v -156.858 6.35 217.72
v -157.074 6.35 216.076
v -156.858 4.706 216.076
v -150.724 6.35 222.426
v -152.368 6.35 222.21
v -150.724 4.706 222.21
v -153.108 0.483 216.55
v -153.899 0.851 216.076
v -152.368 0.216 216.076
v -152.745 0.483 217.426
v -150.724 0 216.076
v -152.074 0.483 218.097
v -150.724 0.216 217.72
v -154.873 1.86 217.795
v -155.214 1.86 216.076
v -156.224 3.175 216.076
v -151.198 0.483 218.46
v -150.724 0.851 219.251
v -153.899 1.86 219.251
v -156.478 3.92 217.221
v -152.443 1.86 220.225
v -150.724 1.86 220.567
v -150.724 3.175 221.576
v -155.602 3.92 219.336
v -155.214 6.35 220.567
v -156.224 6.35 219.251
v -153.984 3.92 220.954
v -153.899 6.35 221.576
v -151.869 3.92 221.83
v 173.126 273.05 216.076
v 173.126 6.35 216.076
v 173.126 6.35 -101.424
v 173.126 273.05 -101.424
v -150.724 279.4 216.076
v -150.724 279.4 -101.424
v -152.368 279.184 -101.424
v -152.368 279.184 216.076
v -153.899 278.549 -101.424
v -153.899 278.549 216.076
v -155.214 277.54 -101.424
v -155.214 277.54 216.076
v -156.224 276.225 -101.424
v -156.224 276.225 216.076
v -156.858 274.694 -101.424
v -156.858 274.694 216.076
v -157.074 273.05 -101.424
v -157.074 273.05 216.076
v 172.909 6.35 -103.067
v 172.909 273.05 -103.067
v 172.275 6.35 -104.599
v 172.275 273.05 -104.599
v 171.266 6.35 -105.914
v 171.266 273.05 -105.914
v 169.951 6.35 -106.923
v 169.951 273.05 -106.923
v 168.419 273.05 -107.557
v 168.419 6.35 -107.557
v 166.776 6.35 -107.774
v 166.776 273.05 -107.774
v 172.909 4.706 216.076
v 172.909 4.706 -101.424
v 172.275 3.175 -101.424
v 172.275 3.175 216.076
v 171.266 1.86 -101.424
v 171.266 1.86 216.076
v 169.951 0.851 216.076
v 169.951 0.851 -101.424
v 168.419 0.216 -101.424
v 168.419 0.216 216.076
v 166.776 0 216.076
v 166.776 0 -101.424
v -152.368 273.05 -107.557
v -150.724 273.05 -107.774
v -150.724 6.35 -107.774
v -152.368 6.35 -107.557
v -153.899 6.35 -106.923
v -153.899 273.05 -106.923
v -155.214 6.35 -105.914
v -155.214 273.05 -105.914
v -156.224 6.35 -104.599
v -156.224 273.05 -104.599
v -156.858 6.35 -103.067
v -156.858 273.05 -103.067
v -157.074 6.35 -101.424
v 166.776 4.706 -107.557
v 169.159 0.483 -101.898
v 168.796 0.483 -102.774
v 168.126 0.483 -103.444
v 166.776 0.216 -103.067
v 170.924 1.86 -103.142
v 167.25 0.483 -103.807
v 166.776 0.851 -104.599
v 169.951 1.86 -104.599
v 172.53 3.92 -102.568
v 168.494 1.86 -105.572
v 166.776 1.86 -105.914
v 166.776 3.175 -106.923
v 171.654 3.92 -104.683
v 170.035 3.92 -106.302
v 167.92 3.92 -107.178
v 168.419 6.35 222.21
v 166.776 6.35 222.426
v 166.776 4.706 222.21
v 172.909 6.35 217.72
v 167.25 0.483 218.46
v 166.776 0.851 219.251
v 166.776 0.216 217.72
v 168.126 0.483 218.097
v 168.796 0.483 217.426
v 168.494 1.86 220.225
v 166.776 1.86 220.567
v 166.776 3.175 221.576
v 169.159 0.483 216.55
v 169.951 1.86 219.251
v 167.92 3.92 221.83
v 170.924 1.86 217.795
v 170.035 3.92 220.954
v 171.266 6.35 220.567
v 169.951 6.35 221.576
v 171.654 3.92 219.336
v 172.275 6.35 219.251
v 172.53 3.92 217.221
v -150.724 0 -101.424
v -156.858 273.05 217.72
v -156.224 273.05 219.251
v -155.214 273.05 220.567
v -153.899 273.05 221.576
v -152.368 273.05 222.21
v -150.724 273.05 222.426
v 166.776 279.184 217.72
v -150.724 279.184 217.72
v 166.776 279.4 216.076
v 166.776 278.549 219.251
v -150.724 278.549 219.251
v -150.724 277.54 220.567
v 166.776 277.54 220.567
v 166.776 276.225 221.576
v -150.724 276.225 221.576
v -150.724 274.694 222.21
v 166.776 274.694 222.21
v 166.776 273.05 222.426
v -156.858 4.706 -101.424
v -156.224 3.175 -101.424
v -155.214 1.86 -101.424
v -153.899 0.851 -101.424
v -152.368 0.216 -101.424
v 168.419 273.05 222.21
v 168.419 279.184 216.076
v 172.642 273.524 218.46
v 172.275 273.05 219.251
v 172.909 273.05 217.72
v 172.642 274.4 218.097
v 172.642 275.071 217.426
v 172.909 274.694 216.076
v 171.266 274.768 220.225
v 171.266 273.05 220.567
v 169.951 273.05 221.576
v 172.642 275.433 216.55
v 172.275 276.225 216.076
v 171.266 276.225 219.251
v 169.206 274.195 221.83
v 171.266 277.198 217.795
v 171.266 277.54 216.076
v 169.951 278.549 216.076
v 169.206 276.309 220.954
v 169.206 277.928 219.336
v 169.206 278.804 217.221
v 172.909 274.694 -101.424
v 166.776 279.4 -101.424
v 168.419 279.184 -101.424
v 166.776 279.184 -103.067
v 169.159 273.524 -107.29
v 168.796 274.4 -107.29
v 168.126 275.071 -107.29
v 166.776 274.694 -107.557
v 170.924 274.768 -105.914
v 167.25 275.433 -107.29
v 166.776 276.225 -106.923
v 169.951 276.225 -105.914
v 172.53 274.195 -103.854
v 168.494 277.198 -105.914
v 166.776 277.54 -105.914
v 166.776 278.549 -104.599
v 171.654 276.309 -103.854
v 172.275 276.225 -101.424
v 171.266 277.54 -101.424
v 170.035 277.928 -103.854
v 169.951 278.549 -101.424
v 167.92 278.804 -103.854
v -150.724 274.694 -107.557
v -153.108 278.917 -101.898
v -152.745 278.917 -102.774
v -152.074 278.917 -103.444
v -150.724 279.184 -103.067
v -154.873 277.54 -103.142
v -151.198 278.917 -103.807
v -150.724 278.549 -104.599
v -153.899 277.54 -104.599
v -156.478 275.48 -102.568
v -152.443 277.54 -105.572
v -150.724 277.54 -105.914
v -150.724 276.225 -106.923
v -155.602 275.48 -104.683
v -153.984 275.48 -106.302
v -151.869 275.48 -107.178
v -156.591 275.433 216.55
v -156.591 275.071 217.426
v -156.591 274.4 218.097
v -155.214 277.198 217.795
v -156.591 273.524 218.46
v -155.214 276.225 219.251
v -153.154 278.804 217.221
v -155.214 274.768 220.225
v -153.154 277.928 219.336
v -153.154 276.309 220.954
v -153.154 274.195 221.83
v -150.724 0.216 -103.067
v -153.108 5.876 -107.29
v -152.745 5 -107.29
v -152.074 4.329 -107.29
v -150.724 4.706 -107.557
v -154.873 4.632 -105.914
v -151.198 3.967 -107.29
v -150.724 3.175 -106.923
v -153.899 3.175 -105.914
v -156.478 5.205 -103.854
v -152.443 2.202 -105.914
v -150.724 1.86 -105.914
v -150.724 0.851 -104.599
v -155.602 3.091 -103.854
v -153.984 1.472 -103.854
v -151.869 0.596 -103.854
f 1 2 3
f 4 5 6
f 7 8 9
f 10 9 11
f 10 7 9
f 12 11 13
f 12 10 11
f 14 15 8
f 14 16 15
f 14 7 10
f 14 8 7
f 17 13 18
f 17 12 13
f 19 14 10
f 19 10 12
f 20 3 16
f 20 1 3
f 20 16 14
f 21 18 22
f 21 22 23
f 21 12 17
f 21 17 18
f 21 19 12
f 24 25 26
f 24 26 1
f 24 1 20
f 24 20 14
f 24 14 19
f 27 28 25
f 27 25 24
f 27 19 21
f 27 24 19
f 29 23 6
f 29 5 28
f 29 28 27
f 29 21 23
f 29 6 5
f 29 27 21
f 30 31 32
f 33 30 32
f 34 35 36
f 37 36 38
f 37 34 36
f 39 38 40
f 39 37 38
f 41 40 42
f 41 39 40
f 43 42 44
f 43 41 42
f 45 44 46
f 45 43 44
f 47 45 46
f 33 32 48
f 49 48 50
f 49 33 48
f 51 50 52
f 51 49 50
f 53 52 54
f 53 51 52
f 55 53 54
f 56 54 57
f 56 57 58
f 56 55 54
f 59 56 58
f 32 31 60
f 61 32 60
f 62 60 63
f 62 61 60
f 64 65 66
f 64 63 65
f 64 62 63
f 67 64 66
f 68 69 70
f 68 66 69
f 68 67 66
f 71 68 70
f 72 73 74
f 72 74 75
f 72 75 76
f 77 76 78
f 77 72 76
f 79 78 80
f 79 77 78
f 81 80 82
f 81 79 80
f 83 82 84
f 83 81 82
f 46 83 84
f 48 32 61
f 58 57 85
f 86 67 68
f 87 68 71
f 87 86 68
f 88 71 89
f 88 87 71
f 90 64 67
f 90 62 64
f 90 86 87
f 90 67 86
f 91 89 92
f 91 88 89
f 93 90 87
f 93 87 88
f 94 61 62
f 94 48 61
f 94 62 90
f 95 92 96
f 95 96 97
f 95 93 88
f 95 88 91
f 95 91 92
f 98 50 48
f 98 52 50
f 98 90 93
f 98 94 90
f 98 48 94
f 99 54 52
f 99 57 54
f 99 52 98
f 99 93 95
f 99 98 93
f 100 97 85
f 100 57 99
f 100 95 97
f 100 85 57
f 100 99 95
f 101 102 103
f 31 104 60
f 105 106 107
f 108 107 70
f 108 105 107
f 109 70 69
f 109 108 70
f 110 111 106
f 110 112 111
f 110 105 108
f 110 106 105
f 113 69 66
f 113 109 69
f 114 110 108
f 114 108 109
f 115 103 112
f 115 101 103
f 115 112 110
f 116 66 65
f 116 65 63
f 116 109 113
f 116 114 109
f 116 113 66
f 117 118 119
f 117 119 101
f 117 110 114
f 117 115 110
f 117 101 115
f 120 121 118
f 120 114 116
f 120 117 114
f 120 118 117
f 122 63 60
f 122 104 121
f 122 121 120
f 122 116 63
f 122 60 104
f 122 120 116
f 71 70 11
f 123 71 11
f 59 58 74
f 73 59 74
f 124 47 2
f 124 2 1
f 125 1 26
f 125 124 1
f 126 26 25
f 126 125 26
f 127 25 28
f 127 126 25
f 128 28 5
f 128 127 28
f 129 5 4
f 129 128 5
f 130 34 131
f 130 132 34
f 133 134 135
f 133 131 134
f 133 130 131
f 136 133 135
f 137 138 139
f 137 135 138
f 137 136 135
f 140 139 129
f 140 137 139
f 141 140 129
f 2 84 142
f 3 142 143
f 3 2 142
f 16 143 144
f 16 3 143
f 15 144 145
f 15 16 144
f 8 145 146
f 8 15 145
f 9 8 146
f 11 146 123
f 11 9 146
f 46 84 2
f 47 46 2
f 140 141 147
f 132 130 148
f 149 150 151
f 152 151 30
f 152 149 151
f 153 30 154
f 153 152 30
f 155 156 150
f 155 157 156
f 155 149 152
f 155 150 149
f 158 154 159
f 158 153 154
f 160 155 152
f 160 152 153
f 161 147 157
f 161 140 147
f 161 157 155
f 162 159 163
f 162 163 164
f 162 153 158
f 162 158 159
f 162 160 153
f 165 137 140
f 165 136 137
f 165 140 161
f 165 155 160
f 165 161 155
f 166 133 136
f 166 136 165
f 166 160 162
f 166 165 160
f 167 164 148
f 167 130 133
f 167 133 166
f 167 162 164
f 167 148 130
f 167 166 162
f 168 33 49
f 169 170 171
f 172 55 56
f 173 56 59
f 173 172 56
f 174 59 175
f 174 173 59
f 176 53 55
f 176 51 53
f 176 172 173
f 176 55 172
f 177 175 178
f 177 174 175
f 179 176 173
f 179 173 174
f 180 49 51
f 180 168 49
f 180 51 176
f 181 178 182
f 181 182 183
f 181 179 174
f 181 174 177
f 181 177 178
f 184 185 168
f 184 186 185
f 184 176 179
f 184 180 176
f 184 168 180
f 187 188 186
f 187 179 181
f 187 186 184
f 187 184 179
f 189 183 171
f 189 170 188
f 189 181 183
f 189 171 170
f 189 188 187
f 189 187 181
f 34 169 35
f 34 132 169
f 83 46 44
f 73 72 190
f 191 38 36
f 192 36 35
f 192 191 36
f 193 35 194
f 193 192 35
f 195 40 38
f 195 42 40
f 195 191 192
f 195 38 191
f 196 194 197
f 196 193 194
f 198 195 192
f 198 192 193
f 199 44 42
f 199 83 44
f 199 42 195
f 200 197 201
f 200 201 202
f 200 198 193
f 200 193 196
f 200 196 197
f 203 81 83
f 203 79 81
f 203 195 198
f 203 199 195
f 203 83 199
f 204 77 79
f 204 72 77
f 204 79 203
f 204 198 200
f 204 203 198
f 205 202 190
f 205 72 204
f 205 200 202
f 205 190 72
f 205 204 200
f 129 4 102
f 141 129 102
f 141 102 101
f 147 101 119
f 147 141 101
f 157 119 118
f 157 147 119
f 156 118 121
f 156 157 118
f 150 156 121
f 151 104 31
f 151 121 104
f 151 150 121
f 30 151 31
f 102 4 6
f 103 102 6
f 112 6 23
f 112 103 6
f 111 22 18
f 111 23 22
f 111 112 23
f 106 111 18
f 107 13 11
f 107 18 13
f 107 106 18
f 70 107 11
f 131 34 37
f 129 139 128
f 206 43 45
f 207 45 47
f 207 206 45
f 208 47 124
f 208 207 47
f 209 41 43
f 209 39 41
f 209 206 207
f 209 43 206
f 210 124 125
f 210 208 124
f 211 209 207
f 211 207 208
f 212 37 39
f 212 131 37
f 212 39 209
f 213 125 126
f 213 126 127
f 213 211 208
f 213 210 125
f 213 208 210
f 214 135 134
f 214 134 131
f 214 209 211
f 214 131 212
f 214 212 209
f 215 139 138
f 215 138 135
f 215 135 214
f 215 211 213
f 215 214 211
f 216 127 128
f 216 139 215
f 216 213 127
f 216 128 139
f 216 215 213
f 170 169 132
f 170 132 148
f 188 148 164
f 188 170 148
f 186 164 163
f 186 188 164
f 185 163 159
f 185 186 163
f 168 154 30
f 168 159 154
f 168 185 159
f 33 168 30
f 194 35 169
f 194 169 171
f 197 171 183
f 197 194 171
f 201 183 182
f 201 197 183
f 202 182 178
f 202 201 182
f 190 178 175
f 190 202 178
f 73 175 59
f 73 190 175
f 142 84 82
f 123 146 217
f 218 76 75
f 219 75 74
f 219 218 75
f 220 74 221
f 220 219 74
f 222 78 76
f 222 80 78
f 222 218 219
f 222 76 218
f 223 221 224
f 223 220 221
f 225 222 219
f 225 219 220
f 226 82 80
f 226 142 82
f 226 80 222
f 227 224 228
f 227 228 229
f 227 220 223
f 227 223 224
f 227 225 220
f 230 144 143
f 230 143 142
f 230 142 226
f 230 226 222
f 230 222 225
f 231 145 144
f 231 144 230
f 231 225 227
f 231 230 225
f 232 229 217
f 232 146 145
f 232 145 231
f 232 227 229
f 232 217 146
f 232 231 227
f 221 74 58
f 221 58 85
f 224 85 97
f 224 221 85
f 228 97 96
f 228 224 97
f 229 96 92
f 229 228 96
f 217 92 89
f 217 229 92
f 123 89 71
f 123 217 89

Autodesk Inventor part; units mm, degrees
ref_plane "YZ Plane" through (0, 0, 0) normal (1, 0, 0) x (0, 1, 0)
ref_plane "XZ Plane" through (0, 0, 0) normal (0, 1, 0) x (-1, 0, 0)
ref_plane "XY Plane" through (0, 0, 0) normal (0, 0, 1) x (1, 0, 0)
sketch "Sketch1" plane through (0, 0, 0) normal (0, 1, 0) x (-1, 0, 0)
  line L0 (157.0743, 222.4264) -> (-173.1257, 222.4264)
  line L1 (-173.1257, 222.4264) -> (-173.1257, -107.7736)
  line L2 (-173.1257, -107.7736) -> (157.0743, -107.7736)
  line L3 (157.0743, -107.7736) -> (157.0743, 222.4264)
  point P0 (0, 0)
  dimension "d0" = 330.2
extrude "Extrusion1" add sketch "Sketch1" along normal blind 279.4
fillet "Fillet1" radius 6.35 12 edges at (8.0257, 279.4, 222.4264) (173.1257, 139.7, 222.4264) (173.1257, 279.4, 57.3264) (173.1257, 139.7, -107.7736) (173.1257, 0, 57.3264) (-157.0743, 139.7, 222.4264) (8.0257, 0, 222.4264) (-157.0743, 0, 57.3264) (8.0257, 0, -107.7736) (-157.0743, 139.7, -107.7736) (-157.0743, 279.4, 57.3264) (8.0257, 279.4, -107.7736)
properties part number "PowerCube" material "PC/ABS Plastic"
